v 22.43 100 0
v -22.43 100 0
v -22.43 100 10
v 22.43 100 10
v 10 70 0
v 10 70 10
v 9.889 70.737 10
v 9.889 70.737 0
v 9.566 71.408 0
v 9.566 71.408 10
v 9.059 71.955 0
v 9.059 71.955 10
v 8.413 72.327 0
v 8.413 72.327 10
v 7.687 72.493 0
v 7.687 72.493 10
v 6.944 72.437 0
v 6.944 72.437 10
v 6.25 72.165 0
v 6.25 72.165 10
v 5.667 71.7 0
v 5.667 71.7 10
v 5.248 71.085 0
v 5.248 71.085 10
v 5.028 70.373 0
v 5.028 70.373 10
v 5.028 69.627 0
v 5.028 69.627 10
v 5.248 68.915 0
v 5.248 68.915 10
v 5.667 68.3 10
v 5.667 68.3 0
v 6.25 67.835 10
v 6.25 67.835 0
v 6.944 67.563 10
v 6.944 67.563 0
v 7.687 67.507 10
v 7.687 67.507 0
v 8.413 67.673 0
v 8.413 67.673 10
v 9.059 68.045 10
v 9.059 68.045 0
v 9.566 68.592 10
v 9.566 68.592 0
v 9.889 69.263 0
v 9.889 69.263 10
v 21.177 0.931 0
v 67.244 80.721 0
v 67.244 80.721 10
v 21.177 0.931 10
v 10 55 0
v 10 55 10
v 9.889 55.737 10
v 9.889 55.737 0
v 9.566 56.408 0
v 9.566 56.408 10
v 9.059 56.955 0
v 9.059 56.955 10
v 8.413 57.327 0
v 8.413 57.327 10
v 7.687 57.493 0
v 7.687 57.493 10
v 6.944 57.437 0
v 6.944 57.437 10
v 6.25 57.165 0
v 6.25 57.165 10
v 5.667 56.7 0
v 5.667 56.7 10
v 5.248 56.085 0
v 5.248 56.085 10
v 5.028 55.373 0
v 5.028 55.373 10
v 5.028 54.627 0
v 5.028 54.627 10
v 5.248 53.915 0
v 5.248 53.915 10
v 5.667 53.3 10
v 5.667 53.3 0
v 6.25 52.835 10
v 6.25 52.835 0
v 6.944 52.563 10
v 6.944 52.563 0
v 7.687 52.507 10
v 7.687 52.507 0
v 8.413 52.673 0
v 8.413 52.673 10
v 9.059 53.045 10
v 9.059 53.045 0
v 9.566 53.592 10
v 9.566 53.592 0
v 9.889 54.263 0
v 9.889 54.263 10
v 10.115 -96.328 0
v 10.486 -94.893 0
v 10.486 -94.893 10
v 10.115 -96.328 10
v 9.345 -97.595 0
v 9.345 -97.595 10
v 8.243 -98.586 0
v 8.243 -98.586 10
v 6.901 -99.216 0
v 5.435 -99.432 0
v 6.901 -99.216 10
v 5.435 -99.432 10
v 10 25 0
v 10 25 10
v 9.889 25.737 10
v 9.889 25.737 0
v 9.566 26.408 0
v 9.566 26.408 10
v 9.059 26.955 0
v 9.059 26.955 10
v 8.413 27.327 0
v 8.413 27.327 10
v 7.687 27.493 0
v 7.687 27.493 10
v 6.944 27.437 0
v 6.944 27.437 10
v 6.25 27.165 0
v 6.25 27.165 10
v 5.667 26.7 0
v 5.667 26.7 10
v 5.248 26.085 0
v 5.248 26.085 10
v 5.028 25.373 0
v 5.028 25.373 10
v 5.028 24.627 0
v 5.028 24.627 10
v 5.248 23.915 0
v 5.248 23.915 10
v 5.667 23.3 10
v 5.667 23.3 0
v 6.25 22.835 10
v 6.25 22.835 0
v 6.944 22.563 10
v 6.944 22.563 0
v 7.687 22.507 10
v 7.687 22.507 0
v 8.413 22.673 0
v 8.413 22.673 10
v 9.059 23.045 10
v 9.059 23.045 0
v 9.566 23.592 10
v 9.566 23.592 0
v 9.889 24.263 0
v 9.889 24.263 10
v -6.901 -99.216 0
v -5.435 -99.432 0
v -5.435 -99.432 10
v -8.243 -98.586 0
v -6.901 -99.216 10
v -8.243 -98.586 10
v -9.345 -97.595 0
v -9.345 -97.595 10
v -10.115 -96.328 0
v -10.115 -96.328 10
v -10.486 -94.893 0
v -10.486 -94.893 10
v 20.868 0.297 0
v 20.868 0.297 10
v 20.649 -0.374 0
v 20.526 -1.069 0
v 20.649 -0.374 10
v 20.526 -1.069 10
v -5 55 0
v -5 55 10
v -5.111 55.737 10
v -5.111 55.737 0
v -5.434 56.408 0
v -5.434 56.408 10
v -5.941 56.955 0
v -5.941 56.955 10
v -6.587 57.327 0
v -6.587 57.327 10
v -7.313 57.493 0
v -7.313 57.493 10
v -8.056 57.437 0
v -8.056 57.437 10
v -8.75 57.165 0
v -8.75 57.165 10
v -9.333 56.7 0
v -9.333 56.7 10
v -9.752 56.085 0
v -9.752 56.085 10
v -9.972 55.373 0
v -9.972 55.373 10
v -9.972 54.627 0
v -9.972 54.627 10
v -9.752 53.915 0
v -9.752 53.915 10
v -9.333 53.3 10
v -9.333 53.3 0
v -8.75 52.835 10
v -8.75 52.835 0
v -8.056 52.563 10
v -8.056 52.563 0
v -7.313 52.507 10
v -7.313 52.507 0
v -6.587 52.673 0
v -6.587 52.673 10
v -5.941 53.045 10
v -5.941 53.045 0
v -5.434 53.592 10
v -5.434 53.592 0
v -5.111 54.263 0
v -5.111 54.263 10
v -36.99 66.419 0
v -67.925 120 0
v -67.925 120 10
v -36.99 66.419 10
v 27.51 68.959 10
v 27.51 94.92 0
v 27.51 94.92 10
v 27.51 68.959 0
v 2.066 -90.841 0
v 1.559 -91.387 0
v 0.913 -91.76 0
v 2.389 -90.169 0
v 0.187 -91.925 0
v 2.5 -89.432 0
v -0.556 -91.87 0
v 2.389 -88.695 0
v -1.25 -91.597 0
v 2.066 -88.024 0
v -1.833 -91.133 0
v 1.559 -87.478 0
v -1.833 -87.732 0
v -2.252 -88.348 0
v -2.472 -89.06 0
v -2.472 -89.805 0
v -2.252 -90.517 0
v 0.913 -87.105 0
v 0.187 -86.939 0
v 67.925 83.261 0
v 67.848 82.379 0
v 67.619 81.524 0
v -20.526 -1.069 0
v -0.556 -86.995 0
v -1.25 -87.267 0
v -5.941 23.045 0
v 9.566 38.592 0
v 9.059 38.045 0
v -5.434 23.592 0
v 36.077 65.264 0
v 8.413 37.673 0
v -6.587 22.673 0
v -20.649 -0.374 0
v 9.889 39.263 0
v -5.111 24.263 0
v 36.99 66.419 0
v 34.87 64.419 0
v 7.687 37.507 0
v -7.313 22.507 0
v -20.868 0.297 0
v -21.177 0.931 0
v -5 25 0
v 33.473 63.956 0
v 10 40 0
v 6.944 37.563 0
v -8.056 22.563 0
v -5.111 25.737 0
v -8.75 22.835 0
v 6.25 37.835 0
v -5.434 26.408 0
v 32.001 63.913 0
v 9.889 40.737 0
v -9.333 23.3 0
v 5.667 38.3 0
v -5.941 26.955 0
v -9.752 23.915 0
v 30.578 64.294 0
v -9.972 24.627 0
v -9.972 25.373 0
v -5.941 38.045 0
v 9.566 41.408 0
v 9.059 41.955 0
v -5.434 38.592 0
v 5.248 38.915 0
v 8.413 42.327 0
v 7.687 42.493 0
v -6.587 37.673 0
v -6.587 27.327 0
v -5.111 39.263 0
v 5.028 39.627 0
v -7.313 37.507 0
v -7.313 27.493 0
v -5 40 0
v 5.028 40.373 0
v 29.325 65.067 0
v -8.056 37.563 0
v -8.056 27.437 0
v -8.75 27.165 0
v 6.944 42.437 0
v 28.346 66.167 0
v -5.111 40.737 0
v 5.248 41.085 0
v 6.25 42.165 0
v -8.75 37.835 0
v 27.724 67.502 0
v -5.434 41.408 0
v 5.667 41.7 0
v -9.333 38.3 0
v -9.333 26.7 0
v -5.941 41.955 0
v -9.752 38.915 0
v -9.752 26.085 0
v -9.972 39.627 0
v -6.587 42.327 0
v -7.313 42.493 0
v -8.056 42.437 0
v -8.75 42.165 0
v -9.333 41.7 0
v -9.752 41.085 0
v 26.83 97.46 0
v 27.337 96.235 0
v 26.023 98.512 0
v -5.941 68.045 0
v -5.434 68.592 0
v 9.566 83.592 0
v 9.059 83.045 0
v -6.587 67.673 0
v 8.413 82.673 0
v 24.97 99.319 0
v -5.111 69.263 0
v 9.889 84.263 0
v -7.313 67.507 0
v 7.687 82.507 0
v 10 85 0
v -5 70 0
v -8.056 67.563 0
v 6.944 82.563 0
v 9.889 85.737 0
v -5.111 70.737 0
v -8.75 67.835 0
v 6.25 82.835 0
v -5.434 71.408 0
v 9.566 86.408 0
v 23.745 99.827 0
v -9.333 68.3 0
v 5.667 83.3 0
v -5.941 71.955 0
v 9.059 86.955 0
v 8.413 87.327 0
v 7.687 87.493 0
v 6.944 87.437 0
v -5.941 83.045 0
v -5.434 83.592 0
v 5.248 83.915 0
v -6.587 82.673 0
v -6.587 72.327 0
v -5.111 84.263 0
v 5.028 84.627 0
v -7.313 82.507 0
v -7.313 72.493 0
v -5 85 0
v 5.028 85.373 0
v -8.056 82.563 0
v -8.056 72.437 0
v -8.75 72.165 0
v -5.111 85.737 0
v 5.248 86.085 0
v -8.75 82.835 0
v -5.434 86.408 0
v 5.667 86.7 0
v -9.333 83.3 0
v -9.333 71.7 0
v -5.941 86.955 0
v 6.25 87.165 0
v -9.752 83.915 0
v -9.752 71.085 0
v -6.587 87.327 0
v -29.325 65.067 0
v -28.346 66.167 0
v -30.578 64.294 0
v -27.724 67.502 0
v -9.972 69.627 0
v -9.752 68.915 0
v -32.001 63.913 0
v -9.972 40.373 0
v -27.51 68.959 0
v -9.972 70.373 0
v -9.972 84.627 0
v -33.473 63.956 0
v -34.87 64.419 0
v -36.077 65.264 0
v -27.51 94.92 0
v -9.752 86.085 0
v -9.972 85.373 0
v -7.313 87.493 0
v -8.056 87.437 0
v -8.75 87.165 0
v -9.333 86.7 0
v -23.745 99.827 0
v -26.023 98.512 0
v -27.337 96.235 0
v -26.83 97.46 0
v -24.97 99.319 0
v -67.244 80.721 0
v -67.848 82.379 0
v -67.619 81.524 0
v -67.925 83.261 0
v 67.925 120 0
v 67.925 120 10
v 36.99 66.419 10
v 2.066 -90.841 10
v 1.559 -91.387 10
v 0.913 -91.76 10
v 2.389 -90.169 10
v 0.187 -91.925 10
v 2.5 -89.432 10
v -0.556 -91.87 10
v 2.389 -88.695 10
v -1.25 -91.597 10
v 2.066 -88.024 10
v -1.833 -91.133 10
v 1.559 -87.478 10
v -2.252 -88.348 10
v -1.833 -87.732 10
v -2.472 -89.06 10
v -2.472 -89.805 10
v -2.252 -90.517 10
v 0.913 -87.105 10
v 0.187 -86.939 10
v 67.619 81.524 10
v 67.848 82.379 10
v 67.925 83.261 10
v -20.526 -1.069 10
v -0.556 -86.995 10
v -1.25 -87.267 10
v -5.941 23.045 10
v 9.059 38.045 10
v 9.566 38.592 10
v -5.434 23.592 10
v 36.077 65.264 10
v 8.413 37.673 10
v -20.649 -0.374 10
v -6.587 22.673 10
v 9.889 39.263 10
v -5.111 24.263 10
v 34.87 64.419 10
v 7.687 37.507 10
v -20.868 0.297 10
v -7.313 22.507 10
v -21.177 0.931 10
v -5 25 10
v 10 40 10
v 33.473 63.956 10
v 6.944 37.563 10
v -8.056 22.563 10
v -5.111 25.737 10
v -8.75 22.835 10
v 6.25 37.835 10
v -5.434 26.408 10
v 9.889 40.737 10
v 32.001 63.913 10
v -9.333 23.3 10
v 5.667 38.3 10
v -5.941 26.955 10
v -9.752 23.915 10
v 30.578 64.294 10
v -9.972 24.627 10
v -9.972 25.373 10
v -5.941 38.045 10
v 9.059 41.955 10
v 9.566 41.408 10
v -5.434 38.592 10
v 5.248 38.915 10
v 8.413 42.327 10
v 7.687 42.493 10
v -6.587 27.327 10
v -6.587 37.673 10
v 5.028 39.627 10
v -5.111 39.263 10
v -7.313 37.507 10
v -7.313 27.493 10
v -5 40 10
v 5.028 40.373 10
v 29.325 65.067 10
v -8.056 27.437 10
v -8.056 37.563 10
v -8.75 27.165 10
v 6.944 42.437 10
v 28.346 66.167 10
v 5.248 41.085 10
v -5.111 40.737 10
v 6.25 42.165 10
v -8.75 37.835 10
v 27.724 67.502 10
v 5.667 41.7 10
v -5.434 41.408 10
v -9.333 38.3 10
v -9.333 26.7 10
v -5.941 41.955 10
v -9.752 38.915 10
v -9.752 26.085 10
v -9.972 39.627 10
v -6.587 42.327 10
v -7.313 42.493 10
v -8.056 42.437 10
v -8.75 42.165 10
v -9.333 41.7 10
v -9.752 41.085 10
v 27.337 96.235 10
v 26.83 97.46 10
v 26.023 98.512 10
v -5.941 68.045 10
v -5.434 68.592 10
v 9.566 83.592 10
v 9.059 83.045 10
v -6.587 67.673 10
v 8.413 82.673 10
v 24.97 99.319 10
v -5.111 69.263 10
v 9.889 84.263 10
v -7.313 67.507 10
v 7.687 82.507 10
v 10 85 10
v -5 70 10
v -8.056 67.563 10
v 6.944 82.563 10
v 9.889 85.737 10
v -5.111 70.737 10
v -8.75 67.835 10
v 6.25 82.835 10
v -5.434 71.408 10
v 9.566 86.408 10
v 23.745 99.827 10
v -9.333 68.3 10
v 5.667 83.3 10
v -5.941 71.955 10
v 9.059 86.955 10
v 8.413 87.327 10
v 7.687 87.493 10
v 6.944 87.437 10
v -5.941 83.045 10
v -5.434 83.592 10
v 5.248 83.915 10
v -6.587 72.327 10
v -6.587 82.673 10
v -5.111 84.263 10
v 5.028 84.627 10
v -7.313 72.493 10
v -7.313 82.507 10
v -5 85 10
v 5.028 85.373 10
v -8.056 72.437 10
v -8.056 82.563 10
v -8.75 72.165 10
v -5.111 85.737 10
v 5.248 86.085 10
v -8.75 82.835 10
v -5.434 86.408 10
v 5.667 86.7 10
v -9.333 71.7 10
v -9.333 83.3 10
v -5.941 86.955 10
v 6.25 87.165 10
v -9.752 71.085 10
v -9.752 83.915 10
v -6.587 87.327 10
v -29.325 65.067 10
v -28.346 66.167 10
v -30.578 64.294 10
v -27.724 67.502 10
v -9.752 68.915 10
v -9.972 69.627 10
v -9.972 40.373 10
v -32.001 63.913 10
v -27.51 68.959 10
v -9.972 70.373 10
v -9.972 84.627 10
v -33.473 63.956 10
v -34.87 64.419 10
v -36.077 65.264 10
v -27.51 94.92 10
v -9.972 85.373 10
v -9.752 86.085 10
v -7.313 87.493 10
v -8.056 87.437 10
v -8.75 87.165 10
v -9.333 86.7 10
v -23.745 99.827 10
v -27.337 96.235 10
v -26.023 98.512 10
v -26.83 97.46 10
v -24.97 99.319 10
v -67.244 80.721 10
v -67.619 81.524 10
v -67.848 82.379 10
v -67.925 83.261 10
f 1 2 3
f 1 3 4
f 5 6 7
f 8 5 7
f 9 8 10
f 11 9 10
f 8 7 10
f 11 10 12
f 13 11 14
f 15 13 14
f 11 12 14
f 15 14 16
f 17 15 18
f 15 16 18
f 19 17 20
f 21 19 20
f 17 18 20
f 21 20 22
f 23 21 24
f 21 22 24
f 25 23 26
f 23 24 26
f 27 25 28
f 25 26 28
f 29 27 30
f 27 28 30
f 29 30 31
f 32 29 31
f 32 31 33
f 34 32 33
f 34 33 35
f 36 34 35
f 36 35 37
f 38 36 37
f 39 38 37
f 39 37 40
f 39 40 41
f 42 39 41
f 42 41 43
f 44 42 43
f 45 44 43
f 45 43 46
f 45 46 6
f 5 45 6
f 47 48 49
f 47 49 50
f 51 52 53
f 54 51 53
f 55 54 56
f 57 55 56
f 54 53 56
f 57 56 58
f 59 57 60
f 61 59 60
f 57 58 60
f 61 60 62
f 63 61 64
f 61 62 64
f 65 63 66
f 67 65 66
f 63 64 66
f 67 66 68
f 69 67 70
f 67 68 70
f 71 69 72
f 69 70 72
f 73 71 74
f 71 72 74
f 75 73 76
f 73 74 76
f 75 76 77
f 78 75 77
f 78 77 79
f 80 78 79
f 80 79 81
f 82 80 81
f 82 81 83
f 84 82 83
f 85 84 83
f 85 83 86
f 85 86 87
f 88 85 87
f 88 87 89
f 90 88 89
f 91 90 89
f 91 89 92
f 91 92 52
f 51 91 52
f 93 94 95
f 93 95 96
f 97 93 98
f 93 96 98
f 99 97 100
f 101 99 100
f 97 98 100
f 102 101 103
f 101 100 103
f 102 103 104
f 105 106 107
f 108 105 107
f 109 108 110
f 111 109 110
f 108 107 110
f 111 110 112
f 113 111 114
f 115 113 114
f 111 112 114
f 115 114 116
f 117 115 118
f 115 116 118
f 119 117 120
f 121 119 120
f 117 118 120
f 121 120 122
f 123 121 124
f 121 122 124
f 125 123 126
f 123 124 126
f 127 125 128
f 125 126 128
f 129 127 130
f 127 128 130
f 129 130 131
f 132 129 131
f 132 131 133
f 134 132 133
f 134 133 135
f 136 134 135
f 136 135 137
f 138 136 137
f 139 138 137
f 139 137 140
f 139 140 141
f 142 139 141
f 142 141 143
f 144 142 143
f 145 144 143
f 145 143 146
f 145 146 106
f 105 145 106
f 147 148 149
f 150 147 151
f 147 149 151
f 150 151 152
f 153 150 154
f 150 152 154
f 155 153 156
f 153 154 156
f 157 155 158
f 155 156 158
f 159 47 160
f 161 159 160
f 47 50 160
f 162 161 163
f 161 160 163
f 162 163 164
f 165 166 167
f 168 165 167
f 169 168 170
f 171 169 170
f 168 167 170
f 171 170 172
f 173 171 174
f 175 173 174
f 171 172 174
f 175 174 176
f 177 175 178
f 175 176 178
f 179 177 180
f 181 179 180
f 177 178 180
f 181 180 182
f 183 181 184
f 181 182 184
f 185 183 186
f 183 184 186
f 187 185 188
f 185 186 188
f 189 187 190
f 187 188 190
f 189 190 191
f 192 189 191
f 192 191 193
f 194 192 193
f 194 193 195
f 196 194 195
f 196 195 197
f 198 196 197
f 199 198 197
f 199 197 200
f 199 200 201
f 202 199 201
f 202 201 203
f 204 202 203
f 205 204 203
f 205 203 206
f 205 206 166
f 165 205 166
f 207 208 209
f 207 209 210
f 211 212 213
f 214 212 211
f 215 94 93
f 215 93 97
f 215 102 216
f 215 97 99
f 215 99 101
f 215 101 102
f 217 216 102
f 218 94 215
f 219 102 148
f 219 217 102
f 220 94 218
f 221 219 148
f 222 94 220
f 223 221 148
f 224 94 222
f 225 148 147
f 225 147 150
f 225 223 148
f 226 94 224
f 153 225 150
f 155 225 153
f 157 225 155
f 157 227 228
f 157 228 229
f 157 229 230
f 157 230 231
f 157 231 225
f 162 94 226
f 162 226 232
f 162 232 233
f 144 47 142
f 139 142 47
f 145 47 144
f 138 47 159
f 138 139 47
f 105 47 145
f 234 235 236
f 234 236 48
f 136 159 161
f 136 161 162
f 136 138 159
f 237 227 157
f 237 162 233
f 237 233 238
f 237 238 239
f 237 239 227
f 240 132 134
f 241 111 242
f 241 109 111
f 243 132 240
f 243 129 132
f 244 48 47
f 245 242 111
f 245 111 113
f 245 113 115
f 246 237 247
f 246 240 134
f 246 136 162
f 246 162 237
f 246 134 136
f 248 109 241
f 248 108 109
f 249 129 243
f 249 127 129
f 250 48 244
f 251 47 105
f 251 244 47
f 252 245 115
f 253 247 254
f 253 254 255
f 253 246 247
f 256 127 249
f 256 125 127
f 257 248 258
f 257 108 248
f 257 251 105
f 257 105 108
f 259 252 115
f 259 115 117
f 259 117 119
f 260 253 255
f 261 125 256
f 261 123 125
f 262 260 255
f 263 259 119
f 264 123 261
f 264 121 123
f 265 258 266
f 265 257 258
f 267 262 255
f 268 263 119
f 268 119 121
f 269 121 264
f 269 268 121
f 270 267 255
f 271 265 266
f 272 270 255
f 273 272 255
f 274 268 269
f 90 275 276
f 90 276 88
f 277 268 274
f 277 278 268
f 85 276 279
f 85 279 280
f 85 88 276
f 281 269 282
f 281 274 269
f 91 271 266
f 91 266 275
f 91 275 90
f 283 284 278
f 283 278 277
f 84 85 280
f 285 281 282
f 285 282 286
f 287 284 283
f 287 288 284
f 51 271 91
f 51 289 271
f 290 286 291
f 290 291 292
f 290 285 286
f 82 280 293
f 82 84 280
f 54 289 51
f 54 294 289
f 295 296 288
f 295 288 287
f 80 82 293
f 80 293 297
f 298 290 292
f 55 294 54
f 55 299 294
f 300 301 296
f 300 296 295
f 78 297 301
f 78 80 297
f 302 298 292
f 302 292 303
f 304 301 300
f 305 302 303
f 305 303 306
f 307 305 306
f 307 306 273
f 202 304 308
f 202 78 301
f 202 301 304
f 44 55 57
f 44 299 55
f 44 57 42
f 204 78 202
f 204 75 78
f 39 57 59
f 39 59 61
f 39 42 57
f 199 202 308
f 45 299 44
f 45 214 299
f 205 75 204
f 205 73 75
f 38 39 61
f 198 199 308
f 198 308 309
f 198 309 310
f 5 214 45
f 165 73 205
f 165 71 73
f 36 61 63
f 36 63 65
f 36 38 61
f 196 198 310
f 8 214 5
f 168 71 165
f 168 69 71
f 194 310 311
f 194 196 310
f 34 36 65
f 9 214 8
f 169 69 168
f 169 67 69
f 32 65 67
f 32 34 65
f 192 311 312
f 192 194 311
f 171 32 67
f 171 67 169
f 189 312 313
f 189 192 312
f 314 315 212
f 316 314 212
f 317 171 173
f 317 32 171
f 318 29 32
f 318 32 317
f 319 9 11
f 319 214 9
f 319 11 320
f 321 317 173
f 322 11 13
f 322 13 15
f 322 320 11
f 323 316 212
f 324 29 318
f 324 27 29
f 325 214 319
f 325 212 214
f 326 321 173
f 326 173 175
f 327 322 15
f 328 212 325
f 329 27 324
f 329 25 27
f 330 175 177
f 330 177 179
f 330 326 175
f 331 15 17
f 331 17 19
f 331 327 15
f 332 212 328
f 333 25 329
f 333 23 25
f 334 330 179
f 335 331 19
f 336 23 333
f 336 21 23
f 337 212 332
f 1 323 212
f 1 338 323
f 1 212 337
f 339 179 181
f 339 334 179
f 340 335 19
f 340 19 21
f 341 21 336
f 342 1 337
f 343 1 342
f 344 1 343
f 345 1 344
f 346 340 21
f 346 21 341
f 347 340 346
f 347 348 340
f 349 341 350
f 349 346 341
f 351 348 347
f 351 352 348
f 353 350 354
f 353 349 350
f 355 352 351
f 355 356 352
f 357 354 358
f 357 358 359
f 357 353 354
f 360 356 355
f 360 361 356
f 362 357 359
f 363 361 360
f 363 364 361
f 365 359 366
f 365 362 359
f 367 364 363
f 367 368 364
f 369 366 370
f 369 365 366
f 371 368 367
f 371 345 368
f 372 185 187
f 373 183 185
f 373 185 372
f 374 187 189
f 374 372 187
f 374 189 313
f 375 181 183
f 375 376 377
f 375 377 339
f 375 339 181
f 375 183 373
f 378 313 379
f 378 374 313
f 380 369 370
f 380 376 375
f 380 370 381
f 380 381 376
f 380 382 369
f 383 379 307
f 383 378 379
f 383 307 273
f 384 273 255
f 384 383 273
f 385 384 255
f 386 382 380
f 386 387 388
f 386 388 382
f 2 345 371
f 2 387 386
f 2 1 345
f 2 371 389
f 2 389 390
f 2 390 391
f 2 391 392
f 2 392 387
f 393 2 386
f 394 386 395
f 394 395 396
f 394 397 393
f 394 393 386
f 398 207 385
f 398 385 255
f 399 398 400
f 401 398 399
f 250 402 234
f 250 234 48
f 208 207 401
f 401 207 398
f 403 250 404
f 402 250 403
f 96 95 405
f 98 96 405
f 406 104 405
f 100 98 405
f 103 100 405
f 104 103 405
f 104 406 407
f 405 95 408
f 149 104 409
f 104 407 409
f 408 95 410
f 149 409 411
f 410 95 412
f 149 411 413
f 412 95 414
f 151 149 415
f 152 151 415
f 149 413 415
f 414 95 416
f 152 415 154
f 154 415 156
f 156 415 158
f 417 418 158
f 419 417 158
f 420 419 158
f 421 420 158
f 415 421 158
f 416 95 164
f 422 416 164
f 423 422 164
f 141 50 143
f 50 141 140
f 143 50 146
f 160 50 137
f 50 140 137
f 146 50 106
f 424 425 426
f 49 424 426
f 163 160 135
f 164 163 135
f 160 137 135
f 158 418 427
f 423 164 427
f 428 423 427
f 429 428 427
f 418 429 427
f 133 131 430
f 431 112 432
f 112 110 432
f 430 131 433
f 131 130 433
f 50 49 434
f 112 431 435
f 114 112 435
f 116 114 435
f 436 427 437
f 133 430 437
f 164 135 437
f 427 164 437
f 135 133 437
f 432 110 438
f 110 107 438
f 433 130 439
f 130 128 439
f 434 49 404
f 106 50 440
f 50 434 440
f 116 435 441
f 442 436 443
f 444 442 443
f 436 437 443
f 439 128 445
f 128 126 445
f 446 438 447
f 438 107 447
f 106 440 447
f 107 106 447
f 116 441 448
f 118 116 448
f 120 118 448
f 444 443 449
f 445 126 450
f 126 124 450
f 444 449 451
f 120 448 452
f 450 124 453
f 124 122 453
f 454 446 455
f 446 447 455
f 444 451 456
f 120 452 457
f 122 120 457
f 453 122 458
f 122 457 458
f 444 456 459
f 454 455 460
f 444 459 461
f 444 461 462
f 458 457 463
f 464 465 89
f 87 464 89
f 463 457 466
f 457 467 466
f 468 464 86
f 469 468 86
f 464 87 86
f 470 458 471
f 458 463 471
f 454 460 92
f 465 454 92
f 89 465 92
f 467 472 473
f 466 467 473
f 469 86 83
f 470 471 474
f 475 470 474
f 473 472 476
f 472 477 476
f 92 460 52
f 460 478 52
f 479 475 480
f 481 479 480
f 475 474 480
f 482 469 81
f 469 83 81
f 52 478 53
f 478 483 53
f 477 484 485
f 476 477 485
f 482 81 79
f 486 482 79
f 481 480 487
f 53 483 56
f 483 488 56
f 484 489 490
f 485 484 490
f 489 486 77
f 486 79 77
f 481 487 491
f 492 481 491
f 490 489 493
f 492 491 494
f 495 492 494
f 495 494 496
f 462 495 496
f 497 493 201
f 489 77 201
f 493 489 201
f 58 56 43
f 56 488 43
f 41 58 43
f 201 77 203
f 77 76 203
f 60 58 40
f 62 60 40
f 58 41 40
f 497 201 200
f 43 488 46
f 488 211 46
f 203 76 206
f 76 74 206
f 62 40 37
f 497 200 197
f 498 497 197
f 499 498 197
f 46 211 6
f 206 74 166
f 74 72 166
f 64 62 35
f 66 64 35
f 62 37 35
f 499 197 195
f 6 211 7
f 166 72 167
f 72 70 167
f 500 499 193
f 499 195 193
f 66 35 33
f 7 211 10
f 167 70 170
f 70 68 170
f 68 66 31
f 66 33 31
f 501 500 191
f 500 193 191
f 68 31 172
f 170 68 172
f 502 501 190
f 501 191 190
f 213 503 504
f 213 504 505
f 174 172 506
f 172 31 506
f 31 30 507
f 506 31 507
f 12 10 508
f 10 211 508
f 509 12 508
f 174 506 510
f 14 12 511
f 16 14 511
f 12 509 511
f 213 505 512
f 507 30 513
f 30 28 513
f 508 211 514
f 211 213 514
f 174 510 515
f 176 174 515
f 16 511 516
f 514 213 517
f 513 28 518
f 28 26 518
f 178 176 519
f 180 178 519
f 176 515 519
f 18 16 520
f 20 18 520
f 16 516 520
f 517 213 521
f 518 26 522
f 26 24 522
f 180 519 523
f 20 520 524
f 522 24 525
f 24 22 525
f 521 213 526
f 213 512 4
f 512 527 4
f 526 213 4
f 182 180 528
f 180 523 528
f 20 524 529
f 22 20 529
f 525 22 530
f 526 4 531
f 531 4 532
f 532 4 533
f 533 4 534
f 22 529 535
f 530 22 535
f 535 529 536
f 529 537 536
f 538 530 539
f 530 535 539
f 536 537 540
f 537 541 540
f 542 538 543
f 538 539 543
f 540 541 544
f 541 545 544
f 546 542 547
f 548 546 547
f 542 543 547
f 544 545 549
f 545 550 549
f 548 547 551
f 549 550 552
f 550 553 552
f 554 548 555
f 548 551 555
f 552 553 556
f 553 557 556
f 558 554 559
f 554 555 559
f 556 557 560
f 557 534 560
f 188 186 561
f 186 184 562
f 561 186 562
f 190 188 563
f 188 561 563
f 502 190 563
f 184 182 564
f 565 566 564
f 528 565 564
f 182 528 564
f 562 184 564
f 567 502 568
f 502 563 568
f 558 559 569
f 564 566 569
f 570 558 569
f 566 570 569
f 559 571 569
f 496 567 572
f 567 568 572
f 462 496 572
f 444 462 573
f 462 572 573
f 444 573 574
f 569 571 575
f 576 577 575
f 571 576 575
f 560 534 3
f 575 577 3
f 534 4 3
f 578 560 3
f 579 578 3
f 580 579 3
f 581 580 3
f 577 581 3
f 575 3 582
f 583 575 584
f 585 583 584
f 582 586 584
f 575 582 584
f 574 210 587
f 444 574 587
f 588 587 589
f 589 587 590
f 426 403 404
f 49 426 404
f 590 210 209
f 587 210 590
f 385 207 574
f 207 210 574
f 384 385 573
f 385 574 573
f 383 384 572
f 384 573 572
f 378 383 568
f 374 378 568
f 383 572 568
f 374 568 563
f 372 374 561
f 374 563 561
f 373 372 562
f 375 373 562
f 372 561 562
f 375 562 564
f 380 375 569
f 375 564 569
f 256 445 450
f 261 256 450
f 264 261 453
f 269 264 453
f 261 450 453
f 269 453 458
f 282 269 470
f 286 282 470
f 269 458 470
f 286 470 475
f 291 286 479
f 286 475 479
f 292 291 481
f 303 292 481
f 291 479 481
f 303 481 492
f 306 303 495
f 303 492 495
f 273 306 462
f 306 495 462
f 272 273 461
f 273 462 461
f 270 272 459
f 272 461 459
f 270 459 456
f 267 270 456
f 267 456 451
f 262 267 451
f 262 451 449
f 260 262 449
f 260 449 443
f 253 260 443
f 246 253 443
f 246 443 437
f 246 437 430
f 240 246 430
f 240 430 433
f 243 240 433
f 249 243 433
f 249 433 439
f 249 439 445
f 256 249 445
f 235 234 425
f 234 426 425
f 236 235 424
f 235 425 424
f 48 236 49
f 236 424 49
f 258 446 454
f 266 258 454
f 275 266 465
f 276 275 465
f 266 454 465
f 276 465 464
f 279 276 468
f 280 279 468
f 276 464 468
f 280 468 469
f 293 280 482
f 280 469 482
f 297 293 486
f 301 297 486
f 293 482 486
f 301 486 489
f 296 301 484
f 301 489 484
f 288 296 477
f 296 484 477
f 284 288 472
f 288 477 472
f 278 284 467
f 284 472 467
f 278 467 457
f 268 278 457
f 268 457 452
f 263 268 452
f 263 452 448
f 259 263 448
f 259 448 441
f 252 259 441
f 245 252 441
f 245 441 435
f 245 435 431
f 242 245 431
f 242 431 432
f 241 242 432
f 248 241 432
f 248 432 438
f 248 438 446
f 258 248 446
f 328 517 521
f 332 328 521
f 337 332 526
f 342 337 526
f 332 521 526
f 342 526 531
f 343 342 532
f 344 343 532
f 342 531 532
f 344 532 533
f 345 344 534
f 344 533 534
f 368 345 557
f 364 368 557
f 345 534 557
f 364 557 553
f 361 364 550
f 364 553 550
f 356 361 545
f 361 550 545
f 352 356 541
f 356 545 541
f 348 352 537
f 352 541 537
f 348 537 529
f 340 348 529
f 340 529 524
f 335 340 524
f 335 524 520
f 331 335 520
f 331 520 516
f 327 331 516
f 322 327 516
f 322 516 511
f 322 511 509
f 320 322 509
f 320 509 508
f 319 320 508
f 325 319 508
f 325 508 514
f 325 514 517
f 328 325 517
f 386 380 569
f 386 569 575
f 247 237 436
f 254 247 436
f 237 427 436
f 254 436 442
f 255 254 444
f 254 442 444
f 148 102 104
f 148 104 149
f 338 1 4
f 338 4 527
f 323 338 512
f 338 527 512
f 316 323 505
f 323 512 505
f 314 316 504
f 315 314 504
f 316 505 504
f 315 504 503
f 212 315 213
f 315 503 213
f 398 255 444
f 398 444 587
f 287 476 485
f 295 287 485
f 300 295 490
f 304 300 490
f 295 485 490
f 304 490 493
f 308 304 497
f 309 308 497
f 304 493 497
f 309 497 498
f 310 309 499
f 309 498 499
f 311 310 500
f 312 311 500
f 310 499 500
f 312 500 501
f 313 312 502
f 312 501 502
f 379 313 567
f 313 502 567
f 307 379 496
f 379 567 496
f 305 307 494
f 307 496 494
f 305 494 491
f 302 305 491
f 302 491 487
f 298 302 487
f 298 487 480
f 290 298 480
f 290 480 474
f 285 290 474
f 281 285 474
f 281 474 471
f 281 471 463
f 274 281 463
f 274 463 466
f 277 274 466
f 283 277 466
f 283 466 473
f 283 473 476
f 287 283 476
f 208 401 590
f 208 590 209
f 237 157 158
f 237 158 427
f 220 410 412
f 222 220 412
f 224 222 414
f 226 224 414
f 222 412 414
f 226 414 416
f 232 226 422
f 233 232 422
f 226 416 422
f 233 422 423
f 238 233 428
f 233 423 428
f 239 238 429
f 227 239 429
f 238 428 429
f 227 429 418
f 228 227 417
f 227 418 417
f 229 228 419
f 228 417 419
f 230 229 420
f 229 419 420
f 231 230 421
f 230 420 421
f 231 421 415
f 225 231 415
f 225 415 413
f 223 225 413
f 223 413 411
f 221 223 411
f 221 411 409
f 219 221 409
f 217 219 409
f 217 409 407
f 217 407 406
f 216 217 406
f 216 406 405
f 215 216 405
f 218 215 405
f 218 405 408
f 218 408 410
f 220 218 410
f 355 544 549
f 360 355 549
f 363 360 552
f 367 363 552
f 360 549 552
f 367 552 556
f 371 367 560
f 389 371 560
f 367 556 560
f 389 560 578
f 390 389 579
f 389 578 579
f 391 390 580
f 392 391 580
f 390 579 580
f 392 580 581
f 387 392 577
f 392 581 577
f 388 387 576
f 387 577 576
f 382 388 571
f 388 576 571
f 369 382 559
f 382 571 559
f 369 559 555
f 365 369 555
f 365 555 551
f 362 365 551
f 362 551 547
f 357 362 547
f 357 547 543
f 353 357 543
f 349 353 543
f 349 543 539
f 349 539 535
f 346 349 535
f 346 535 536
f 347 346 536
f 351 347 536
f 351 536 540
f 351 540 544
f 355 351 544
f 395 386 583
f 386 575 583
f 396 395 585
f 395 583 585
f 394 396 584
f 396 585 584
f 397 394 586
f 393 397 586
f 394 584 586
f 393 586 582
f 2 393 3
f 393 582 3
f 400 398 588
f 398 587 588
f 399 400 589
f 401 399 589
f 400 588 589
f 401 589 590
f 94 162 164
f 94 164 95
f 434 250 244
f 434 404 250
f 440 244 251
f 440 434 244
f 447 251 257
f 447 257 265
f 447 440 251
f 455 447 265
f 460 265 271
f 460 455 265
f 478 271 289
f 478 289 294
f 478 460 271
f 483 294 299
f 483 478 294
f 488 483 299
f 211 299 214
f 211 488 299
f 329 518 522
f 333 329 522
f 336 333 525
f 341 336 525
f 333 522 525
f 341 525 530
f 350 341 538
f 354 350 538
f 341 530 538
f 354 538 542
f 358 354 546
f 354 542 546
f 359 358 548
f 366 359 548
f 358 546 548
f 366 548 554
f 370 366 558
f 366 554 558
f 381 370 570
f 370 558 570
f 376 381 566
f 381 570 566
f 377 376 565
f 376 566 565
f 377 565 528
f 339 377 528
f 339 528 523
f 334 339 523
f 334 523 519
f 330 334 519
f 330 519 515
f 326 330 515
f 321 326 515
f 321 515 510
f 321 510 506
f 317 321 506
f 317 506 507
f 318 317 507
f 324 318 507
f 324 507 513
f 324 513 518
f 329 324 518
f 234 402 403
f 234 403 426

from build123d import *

# Parameters (mm, degrees)
BOSS_EXTRUDE1_DEPTH   = 10
FILLET1_R             = 5.08
F_5_0MM_DOWEL_HOLE1_D = 5
SKETCH14_R            = 2.5
CUT_EXTRUDE1_DEPTH    = 139.252681223
LPATTERN1_COUNT       = 5
LPATTERN1_PITCH       = 15


with BuildPart() as part:
    # Sketch1 → Boss-Extrude1 (new body)
    with BuildSketch(Plane.XY):
        Polygon((27.510468203, 50), (67.924987047, 120), (67.924987047, 81.9), (20.64, 0), (10, -99.432340815), (-10, -99.432340815), (-20.64, 0), (-67.924987047, 81.9), (-67.924987047, 120), (-27.510468203, 50), (-27.510468203, 100), (27.510468203, 100), align=None)
    extrude(amount=BOSS_EXTRUDE1_DEPTH)

    # Fillet1
    fillet1_edges = [part.edges().sort_by_distance(p)[0] for p in [
        (-27.510468203, 100, 5),
        (27.510468203, 100, 5),
        (27.510468203, 50, 5),
        (67.924987047, 81.9, 5),
        (20.64, 0, 5),
        (10, -99.432340815, 5),
        (-10, -99.432340815, 5),
        (-20.64, 0, 5),
        (-67.924987047, 81.9, 5),
        (-27.510468203, 50, 5),
    ]]
    fillet(fillet1_edges, radius=FILLET1_R)

    # Ø5.0mm Dowel Hole1 (through all)
    with Locations(Plane(origin=(0, 0, 0), x_dir=(-1, 0, 0), z_dir=(0, 0, -1))):
        with Locations((7.5, 25), (-7.5, 25)):
            f_5_0mm_dowel_hole1 = Hole(F_5_0MM_DOWEL_HOLE1_D / 2)

    # Sketch14 → Cut-Extrude1 (cut, through all)
    with BuildSketch(Plane.XY.offset(10)):
        with Locations((0, -89.432340815)):
            Circle(SKETCH14_R)
    extrude(amount=-CUT_EXTRUDE1_DEPTH, mode=Mode.SUBTRACT)

    # LPattern1: Ø5.0mm Dowel Hole1 ×5
    with Locations(*[(0, i * LPATTERN1_PITCH, 0) for i in range(1, LPATTERN1_COUNT)]):
        add(f_5_0mm_dowel_hole1, mode=Mode.SUBTRACT)


solid = part.part
